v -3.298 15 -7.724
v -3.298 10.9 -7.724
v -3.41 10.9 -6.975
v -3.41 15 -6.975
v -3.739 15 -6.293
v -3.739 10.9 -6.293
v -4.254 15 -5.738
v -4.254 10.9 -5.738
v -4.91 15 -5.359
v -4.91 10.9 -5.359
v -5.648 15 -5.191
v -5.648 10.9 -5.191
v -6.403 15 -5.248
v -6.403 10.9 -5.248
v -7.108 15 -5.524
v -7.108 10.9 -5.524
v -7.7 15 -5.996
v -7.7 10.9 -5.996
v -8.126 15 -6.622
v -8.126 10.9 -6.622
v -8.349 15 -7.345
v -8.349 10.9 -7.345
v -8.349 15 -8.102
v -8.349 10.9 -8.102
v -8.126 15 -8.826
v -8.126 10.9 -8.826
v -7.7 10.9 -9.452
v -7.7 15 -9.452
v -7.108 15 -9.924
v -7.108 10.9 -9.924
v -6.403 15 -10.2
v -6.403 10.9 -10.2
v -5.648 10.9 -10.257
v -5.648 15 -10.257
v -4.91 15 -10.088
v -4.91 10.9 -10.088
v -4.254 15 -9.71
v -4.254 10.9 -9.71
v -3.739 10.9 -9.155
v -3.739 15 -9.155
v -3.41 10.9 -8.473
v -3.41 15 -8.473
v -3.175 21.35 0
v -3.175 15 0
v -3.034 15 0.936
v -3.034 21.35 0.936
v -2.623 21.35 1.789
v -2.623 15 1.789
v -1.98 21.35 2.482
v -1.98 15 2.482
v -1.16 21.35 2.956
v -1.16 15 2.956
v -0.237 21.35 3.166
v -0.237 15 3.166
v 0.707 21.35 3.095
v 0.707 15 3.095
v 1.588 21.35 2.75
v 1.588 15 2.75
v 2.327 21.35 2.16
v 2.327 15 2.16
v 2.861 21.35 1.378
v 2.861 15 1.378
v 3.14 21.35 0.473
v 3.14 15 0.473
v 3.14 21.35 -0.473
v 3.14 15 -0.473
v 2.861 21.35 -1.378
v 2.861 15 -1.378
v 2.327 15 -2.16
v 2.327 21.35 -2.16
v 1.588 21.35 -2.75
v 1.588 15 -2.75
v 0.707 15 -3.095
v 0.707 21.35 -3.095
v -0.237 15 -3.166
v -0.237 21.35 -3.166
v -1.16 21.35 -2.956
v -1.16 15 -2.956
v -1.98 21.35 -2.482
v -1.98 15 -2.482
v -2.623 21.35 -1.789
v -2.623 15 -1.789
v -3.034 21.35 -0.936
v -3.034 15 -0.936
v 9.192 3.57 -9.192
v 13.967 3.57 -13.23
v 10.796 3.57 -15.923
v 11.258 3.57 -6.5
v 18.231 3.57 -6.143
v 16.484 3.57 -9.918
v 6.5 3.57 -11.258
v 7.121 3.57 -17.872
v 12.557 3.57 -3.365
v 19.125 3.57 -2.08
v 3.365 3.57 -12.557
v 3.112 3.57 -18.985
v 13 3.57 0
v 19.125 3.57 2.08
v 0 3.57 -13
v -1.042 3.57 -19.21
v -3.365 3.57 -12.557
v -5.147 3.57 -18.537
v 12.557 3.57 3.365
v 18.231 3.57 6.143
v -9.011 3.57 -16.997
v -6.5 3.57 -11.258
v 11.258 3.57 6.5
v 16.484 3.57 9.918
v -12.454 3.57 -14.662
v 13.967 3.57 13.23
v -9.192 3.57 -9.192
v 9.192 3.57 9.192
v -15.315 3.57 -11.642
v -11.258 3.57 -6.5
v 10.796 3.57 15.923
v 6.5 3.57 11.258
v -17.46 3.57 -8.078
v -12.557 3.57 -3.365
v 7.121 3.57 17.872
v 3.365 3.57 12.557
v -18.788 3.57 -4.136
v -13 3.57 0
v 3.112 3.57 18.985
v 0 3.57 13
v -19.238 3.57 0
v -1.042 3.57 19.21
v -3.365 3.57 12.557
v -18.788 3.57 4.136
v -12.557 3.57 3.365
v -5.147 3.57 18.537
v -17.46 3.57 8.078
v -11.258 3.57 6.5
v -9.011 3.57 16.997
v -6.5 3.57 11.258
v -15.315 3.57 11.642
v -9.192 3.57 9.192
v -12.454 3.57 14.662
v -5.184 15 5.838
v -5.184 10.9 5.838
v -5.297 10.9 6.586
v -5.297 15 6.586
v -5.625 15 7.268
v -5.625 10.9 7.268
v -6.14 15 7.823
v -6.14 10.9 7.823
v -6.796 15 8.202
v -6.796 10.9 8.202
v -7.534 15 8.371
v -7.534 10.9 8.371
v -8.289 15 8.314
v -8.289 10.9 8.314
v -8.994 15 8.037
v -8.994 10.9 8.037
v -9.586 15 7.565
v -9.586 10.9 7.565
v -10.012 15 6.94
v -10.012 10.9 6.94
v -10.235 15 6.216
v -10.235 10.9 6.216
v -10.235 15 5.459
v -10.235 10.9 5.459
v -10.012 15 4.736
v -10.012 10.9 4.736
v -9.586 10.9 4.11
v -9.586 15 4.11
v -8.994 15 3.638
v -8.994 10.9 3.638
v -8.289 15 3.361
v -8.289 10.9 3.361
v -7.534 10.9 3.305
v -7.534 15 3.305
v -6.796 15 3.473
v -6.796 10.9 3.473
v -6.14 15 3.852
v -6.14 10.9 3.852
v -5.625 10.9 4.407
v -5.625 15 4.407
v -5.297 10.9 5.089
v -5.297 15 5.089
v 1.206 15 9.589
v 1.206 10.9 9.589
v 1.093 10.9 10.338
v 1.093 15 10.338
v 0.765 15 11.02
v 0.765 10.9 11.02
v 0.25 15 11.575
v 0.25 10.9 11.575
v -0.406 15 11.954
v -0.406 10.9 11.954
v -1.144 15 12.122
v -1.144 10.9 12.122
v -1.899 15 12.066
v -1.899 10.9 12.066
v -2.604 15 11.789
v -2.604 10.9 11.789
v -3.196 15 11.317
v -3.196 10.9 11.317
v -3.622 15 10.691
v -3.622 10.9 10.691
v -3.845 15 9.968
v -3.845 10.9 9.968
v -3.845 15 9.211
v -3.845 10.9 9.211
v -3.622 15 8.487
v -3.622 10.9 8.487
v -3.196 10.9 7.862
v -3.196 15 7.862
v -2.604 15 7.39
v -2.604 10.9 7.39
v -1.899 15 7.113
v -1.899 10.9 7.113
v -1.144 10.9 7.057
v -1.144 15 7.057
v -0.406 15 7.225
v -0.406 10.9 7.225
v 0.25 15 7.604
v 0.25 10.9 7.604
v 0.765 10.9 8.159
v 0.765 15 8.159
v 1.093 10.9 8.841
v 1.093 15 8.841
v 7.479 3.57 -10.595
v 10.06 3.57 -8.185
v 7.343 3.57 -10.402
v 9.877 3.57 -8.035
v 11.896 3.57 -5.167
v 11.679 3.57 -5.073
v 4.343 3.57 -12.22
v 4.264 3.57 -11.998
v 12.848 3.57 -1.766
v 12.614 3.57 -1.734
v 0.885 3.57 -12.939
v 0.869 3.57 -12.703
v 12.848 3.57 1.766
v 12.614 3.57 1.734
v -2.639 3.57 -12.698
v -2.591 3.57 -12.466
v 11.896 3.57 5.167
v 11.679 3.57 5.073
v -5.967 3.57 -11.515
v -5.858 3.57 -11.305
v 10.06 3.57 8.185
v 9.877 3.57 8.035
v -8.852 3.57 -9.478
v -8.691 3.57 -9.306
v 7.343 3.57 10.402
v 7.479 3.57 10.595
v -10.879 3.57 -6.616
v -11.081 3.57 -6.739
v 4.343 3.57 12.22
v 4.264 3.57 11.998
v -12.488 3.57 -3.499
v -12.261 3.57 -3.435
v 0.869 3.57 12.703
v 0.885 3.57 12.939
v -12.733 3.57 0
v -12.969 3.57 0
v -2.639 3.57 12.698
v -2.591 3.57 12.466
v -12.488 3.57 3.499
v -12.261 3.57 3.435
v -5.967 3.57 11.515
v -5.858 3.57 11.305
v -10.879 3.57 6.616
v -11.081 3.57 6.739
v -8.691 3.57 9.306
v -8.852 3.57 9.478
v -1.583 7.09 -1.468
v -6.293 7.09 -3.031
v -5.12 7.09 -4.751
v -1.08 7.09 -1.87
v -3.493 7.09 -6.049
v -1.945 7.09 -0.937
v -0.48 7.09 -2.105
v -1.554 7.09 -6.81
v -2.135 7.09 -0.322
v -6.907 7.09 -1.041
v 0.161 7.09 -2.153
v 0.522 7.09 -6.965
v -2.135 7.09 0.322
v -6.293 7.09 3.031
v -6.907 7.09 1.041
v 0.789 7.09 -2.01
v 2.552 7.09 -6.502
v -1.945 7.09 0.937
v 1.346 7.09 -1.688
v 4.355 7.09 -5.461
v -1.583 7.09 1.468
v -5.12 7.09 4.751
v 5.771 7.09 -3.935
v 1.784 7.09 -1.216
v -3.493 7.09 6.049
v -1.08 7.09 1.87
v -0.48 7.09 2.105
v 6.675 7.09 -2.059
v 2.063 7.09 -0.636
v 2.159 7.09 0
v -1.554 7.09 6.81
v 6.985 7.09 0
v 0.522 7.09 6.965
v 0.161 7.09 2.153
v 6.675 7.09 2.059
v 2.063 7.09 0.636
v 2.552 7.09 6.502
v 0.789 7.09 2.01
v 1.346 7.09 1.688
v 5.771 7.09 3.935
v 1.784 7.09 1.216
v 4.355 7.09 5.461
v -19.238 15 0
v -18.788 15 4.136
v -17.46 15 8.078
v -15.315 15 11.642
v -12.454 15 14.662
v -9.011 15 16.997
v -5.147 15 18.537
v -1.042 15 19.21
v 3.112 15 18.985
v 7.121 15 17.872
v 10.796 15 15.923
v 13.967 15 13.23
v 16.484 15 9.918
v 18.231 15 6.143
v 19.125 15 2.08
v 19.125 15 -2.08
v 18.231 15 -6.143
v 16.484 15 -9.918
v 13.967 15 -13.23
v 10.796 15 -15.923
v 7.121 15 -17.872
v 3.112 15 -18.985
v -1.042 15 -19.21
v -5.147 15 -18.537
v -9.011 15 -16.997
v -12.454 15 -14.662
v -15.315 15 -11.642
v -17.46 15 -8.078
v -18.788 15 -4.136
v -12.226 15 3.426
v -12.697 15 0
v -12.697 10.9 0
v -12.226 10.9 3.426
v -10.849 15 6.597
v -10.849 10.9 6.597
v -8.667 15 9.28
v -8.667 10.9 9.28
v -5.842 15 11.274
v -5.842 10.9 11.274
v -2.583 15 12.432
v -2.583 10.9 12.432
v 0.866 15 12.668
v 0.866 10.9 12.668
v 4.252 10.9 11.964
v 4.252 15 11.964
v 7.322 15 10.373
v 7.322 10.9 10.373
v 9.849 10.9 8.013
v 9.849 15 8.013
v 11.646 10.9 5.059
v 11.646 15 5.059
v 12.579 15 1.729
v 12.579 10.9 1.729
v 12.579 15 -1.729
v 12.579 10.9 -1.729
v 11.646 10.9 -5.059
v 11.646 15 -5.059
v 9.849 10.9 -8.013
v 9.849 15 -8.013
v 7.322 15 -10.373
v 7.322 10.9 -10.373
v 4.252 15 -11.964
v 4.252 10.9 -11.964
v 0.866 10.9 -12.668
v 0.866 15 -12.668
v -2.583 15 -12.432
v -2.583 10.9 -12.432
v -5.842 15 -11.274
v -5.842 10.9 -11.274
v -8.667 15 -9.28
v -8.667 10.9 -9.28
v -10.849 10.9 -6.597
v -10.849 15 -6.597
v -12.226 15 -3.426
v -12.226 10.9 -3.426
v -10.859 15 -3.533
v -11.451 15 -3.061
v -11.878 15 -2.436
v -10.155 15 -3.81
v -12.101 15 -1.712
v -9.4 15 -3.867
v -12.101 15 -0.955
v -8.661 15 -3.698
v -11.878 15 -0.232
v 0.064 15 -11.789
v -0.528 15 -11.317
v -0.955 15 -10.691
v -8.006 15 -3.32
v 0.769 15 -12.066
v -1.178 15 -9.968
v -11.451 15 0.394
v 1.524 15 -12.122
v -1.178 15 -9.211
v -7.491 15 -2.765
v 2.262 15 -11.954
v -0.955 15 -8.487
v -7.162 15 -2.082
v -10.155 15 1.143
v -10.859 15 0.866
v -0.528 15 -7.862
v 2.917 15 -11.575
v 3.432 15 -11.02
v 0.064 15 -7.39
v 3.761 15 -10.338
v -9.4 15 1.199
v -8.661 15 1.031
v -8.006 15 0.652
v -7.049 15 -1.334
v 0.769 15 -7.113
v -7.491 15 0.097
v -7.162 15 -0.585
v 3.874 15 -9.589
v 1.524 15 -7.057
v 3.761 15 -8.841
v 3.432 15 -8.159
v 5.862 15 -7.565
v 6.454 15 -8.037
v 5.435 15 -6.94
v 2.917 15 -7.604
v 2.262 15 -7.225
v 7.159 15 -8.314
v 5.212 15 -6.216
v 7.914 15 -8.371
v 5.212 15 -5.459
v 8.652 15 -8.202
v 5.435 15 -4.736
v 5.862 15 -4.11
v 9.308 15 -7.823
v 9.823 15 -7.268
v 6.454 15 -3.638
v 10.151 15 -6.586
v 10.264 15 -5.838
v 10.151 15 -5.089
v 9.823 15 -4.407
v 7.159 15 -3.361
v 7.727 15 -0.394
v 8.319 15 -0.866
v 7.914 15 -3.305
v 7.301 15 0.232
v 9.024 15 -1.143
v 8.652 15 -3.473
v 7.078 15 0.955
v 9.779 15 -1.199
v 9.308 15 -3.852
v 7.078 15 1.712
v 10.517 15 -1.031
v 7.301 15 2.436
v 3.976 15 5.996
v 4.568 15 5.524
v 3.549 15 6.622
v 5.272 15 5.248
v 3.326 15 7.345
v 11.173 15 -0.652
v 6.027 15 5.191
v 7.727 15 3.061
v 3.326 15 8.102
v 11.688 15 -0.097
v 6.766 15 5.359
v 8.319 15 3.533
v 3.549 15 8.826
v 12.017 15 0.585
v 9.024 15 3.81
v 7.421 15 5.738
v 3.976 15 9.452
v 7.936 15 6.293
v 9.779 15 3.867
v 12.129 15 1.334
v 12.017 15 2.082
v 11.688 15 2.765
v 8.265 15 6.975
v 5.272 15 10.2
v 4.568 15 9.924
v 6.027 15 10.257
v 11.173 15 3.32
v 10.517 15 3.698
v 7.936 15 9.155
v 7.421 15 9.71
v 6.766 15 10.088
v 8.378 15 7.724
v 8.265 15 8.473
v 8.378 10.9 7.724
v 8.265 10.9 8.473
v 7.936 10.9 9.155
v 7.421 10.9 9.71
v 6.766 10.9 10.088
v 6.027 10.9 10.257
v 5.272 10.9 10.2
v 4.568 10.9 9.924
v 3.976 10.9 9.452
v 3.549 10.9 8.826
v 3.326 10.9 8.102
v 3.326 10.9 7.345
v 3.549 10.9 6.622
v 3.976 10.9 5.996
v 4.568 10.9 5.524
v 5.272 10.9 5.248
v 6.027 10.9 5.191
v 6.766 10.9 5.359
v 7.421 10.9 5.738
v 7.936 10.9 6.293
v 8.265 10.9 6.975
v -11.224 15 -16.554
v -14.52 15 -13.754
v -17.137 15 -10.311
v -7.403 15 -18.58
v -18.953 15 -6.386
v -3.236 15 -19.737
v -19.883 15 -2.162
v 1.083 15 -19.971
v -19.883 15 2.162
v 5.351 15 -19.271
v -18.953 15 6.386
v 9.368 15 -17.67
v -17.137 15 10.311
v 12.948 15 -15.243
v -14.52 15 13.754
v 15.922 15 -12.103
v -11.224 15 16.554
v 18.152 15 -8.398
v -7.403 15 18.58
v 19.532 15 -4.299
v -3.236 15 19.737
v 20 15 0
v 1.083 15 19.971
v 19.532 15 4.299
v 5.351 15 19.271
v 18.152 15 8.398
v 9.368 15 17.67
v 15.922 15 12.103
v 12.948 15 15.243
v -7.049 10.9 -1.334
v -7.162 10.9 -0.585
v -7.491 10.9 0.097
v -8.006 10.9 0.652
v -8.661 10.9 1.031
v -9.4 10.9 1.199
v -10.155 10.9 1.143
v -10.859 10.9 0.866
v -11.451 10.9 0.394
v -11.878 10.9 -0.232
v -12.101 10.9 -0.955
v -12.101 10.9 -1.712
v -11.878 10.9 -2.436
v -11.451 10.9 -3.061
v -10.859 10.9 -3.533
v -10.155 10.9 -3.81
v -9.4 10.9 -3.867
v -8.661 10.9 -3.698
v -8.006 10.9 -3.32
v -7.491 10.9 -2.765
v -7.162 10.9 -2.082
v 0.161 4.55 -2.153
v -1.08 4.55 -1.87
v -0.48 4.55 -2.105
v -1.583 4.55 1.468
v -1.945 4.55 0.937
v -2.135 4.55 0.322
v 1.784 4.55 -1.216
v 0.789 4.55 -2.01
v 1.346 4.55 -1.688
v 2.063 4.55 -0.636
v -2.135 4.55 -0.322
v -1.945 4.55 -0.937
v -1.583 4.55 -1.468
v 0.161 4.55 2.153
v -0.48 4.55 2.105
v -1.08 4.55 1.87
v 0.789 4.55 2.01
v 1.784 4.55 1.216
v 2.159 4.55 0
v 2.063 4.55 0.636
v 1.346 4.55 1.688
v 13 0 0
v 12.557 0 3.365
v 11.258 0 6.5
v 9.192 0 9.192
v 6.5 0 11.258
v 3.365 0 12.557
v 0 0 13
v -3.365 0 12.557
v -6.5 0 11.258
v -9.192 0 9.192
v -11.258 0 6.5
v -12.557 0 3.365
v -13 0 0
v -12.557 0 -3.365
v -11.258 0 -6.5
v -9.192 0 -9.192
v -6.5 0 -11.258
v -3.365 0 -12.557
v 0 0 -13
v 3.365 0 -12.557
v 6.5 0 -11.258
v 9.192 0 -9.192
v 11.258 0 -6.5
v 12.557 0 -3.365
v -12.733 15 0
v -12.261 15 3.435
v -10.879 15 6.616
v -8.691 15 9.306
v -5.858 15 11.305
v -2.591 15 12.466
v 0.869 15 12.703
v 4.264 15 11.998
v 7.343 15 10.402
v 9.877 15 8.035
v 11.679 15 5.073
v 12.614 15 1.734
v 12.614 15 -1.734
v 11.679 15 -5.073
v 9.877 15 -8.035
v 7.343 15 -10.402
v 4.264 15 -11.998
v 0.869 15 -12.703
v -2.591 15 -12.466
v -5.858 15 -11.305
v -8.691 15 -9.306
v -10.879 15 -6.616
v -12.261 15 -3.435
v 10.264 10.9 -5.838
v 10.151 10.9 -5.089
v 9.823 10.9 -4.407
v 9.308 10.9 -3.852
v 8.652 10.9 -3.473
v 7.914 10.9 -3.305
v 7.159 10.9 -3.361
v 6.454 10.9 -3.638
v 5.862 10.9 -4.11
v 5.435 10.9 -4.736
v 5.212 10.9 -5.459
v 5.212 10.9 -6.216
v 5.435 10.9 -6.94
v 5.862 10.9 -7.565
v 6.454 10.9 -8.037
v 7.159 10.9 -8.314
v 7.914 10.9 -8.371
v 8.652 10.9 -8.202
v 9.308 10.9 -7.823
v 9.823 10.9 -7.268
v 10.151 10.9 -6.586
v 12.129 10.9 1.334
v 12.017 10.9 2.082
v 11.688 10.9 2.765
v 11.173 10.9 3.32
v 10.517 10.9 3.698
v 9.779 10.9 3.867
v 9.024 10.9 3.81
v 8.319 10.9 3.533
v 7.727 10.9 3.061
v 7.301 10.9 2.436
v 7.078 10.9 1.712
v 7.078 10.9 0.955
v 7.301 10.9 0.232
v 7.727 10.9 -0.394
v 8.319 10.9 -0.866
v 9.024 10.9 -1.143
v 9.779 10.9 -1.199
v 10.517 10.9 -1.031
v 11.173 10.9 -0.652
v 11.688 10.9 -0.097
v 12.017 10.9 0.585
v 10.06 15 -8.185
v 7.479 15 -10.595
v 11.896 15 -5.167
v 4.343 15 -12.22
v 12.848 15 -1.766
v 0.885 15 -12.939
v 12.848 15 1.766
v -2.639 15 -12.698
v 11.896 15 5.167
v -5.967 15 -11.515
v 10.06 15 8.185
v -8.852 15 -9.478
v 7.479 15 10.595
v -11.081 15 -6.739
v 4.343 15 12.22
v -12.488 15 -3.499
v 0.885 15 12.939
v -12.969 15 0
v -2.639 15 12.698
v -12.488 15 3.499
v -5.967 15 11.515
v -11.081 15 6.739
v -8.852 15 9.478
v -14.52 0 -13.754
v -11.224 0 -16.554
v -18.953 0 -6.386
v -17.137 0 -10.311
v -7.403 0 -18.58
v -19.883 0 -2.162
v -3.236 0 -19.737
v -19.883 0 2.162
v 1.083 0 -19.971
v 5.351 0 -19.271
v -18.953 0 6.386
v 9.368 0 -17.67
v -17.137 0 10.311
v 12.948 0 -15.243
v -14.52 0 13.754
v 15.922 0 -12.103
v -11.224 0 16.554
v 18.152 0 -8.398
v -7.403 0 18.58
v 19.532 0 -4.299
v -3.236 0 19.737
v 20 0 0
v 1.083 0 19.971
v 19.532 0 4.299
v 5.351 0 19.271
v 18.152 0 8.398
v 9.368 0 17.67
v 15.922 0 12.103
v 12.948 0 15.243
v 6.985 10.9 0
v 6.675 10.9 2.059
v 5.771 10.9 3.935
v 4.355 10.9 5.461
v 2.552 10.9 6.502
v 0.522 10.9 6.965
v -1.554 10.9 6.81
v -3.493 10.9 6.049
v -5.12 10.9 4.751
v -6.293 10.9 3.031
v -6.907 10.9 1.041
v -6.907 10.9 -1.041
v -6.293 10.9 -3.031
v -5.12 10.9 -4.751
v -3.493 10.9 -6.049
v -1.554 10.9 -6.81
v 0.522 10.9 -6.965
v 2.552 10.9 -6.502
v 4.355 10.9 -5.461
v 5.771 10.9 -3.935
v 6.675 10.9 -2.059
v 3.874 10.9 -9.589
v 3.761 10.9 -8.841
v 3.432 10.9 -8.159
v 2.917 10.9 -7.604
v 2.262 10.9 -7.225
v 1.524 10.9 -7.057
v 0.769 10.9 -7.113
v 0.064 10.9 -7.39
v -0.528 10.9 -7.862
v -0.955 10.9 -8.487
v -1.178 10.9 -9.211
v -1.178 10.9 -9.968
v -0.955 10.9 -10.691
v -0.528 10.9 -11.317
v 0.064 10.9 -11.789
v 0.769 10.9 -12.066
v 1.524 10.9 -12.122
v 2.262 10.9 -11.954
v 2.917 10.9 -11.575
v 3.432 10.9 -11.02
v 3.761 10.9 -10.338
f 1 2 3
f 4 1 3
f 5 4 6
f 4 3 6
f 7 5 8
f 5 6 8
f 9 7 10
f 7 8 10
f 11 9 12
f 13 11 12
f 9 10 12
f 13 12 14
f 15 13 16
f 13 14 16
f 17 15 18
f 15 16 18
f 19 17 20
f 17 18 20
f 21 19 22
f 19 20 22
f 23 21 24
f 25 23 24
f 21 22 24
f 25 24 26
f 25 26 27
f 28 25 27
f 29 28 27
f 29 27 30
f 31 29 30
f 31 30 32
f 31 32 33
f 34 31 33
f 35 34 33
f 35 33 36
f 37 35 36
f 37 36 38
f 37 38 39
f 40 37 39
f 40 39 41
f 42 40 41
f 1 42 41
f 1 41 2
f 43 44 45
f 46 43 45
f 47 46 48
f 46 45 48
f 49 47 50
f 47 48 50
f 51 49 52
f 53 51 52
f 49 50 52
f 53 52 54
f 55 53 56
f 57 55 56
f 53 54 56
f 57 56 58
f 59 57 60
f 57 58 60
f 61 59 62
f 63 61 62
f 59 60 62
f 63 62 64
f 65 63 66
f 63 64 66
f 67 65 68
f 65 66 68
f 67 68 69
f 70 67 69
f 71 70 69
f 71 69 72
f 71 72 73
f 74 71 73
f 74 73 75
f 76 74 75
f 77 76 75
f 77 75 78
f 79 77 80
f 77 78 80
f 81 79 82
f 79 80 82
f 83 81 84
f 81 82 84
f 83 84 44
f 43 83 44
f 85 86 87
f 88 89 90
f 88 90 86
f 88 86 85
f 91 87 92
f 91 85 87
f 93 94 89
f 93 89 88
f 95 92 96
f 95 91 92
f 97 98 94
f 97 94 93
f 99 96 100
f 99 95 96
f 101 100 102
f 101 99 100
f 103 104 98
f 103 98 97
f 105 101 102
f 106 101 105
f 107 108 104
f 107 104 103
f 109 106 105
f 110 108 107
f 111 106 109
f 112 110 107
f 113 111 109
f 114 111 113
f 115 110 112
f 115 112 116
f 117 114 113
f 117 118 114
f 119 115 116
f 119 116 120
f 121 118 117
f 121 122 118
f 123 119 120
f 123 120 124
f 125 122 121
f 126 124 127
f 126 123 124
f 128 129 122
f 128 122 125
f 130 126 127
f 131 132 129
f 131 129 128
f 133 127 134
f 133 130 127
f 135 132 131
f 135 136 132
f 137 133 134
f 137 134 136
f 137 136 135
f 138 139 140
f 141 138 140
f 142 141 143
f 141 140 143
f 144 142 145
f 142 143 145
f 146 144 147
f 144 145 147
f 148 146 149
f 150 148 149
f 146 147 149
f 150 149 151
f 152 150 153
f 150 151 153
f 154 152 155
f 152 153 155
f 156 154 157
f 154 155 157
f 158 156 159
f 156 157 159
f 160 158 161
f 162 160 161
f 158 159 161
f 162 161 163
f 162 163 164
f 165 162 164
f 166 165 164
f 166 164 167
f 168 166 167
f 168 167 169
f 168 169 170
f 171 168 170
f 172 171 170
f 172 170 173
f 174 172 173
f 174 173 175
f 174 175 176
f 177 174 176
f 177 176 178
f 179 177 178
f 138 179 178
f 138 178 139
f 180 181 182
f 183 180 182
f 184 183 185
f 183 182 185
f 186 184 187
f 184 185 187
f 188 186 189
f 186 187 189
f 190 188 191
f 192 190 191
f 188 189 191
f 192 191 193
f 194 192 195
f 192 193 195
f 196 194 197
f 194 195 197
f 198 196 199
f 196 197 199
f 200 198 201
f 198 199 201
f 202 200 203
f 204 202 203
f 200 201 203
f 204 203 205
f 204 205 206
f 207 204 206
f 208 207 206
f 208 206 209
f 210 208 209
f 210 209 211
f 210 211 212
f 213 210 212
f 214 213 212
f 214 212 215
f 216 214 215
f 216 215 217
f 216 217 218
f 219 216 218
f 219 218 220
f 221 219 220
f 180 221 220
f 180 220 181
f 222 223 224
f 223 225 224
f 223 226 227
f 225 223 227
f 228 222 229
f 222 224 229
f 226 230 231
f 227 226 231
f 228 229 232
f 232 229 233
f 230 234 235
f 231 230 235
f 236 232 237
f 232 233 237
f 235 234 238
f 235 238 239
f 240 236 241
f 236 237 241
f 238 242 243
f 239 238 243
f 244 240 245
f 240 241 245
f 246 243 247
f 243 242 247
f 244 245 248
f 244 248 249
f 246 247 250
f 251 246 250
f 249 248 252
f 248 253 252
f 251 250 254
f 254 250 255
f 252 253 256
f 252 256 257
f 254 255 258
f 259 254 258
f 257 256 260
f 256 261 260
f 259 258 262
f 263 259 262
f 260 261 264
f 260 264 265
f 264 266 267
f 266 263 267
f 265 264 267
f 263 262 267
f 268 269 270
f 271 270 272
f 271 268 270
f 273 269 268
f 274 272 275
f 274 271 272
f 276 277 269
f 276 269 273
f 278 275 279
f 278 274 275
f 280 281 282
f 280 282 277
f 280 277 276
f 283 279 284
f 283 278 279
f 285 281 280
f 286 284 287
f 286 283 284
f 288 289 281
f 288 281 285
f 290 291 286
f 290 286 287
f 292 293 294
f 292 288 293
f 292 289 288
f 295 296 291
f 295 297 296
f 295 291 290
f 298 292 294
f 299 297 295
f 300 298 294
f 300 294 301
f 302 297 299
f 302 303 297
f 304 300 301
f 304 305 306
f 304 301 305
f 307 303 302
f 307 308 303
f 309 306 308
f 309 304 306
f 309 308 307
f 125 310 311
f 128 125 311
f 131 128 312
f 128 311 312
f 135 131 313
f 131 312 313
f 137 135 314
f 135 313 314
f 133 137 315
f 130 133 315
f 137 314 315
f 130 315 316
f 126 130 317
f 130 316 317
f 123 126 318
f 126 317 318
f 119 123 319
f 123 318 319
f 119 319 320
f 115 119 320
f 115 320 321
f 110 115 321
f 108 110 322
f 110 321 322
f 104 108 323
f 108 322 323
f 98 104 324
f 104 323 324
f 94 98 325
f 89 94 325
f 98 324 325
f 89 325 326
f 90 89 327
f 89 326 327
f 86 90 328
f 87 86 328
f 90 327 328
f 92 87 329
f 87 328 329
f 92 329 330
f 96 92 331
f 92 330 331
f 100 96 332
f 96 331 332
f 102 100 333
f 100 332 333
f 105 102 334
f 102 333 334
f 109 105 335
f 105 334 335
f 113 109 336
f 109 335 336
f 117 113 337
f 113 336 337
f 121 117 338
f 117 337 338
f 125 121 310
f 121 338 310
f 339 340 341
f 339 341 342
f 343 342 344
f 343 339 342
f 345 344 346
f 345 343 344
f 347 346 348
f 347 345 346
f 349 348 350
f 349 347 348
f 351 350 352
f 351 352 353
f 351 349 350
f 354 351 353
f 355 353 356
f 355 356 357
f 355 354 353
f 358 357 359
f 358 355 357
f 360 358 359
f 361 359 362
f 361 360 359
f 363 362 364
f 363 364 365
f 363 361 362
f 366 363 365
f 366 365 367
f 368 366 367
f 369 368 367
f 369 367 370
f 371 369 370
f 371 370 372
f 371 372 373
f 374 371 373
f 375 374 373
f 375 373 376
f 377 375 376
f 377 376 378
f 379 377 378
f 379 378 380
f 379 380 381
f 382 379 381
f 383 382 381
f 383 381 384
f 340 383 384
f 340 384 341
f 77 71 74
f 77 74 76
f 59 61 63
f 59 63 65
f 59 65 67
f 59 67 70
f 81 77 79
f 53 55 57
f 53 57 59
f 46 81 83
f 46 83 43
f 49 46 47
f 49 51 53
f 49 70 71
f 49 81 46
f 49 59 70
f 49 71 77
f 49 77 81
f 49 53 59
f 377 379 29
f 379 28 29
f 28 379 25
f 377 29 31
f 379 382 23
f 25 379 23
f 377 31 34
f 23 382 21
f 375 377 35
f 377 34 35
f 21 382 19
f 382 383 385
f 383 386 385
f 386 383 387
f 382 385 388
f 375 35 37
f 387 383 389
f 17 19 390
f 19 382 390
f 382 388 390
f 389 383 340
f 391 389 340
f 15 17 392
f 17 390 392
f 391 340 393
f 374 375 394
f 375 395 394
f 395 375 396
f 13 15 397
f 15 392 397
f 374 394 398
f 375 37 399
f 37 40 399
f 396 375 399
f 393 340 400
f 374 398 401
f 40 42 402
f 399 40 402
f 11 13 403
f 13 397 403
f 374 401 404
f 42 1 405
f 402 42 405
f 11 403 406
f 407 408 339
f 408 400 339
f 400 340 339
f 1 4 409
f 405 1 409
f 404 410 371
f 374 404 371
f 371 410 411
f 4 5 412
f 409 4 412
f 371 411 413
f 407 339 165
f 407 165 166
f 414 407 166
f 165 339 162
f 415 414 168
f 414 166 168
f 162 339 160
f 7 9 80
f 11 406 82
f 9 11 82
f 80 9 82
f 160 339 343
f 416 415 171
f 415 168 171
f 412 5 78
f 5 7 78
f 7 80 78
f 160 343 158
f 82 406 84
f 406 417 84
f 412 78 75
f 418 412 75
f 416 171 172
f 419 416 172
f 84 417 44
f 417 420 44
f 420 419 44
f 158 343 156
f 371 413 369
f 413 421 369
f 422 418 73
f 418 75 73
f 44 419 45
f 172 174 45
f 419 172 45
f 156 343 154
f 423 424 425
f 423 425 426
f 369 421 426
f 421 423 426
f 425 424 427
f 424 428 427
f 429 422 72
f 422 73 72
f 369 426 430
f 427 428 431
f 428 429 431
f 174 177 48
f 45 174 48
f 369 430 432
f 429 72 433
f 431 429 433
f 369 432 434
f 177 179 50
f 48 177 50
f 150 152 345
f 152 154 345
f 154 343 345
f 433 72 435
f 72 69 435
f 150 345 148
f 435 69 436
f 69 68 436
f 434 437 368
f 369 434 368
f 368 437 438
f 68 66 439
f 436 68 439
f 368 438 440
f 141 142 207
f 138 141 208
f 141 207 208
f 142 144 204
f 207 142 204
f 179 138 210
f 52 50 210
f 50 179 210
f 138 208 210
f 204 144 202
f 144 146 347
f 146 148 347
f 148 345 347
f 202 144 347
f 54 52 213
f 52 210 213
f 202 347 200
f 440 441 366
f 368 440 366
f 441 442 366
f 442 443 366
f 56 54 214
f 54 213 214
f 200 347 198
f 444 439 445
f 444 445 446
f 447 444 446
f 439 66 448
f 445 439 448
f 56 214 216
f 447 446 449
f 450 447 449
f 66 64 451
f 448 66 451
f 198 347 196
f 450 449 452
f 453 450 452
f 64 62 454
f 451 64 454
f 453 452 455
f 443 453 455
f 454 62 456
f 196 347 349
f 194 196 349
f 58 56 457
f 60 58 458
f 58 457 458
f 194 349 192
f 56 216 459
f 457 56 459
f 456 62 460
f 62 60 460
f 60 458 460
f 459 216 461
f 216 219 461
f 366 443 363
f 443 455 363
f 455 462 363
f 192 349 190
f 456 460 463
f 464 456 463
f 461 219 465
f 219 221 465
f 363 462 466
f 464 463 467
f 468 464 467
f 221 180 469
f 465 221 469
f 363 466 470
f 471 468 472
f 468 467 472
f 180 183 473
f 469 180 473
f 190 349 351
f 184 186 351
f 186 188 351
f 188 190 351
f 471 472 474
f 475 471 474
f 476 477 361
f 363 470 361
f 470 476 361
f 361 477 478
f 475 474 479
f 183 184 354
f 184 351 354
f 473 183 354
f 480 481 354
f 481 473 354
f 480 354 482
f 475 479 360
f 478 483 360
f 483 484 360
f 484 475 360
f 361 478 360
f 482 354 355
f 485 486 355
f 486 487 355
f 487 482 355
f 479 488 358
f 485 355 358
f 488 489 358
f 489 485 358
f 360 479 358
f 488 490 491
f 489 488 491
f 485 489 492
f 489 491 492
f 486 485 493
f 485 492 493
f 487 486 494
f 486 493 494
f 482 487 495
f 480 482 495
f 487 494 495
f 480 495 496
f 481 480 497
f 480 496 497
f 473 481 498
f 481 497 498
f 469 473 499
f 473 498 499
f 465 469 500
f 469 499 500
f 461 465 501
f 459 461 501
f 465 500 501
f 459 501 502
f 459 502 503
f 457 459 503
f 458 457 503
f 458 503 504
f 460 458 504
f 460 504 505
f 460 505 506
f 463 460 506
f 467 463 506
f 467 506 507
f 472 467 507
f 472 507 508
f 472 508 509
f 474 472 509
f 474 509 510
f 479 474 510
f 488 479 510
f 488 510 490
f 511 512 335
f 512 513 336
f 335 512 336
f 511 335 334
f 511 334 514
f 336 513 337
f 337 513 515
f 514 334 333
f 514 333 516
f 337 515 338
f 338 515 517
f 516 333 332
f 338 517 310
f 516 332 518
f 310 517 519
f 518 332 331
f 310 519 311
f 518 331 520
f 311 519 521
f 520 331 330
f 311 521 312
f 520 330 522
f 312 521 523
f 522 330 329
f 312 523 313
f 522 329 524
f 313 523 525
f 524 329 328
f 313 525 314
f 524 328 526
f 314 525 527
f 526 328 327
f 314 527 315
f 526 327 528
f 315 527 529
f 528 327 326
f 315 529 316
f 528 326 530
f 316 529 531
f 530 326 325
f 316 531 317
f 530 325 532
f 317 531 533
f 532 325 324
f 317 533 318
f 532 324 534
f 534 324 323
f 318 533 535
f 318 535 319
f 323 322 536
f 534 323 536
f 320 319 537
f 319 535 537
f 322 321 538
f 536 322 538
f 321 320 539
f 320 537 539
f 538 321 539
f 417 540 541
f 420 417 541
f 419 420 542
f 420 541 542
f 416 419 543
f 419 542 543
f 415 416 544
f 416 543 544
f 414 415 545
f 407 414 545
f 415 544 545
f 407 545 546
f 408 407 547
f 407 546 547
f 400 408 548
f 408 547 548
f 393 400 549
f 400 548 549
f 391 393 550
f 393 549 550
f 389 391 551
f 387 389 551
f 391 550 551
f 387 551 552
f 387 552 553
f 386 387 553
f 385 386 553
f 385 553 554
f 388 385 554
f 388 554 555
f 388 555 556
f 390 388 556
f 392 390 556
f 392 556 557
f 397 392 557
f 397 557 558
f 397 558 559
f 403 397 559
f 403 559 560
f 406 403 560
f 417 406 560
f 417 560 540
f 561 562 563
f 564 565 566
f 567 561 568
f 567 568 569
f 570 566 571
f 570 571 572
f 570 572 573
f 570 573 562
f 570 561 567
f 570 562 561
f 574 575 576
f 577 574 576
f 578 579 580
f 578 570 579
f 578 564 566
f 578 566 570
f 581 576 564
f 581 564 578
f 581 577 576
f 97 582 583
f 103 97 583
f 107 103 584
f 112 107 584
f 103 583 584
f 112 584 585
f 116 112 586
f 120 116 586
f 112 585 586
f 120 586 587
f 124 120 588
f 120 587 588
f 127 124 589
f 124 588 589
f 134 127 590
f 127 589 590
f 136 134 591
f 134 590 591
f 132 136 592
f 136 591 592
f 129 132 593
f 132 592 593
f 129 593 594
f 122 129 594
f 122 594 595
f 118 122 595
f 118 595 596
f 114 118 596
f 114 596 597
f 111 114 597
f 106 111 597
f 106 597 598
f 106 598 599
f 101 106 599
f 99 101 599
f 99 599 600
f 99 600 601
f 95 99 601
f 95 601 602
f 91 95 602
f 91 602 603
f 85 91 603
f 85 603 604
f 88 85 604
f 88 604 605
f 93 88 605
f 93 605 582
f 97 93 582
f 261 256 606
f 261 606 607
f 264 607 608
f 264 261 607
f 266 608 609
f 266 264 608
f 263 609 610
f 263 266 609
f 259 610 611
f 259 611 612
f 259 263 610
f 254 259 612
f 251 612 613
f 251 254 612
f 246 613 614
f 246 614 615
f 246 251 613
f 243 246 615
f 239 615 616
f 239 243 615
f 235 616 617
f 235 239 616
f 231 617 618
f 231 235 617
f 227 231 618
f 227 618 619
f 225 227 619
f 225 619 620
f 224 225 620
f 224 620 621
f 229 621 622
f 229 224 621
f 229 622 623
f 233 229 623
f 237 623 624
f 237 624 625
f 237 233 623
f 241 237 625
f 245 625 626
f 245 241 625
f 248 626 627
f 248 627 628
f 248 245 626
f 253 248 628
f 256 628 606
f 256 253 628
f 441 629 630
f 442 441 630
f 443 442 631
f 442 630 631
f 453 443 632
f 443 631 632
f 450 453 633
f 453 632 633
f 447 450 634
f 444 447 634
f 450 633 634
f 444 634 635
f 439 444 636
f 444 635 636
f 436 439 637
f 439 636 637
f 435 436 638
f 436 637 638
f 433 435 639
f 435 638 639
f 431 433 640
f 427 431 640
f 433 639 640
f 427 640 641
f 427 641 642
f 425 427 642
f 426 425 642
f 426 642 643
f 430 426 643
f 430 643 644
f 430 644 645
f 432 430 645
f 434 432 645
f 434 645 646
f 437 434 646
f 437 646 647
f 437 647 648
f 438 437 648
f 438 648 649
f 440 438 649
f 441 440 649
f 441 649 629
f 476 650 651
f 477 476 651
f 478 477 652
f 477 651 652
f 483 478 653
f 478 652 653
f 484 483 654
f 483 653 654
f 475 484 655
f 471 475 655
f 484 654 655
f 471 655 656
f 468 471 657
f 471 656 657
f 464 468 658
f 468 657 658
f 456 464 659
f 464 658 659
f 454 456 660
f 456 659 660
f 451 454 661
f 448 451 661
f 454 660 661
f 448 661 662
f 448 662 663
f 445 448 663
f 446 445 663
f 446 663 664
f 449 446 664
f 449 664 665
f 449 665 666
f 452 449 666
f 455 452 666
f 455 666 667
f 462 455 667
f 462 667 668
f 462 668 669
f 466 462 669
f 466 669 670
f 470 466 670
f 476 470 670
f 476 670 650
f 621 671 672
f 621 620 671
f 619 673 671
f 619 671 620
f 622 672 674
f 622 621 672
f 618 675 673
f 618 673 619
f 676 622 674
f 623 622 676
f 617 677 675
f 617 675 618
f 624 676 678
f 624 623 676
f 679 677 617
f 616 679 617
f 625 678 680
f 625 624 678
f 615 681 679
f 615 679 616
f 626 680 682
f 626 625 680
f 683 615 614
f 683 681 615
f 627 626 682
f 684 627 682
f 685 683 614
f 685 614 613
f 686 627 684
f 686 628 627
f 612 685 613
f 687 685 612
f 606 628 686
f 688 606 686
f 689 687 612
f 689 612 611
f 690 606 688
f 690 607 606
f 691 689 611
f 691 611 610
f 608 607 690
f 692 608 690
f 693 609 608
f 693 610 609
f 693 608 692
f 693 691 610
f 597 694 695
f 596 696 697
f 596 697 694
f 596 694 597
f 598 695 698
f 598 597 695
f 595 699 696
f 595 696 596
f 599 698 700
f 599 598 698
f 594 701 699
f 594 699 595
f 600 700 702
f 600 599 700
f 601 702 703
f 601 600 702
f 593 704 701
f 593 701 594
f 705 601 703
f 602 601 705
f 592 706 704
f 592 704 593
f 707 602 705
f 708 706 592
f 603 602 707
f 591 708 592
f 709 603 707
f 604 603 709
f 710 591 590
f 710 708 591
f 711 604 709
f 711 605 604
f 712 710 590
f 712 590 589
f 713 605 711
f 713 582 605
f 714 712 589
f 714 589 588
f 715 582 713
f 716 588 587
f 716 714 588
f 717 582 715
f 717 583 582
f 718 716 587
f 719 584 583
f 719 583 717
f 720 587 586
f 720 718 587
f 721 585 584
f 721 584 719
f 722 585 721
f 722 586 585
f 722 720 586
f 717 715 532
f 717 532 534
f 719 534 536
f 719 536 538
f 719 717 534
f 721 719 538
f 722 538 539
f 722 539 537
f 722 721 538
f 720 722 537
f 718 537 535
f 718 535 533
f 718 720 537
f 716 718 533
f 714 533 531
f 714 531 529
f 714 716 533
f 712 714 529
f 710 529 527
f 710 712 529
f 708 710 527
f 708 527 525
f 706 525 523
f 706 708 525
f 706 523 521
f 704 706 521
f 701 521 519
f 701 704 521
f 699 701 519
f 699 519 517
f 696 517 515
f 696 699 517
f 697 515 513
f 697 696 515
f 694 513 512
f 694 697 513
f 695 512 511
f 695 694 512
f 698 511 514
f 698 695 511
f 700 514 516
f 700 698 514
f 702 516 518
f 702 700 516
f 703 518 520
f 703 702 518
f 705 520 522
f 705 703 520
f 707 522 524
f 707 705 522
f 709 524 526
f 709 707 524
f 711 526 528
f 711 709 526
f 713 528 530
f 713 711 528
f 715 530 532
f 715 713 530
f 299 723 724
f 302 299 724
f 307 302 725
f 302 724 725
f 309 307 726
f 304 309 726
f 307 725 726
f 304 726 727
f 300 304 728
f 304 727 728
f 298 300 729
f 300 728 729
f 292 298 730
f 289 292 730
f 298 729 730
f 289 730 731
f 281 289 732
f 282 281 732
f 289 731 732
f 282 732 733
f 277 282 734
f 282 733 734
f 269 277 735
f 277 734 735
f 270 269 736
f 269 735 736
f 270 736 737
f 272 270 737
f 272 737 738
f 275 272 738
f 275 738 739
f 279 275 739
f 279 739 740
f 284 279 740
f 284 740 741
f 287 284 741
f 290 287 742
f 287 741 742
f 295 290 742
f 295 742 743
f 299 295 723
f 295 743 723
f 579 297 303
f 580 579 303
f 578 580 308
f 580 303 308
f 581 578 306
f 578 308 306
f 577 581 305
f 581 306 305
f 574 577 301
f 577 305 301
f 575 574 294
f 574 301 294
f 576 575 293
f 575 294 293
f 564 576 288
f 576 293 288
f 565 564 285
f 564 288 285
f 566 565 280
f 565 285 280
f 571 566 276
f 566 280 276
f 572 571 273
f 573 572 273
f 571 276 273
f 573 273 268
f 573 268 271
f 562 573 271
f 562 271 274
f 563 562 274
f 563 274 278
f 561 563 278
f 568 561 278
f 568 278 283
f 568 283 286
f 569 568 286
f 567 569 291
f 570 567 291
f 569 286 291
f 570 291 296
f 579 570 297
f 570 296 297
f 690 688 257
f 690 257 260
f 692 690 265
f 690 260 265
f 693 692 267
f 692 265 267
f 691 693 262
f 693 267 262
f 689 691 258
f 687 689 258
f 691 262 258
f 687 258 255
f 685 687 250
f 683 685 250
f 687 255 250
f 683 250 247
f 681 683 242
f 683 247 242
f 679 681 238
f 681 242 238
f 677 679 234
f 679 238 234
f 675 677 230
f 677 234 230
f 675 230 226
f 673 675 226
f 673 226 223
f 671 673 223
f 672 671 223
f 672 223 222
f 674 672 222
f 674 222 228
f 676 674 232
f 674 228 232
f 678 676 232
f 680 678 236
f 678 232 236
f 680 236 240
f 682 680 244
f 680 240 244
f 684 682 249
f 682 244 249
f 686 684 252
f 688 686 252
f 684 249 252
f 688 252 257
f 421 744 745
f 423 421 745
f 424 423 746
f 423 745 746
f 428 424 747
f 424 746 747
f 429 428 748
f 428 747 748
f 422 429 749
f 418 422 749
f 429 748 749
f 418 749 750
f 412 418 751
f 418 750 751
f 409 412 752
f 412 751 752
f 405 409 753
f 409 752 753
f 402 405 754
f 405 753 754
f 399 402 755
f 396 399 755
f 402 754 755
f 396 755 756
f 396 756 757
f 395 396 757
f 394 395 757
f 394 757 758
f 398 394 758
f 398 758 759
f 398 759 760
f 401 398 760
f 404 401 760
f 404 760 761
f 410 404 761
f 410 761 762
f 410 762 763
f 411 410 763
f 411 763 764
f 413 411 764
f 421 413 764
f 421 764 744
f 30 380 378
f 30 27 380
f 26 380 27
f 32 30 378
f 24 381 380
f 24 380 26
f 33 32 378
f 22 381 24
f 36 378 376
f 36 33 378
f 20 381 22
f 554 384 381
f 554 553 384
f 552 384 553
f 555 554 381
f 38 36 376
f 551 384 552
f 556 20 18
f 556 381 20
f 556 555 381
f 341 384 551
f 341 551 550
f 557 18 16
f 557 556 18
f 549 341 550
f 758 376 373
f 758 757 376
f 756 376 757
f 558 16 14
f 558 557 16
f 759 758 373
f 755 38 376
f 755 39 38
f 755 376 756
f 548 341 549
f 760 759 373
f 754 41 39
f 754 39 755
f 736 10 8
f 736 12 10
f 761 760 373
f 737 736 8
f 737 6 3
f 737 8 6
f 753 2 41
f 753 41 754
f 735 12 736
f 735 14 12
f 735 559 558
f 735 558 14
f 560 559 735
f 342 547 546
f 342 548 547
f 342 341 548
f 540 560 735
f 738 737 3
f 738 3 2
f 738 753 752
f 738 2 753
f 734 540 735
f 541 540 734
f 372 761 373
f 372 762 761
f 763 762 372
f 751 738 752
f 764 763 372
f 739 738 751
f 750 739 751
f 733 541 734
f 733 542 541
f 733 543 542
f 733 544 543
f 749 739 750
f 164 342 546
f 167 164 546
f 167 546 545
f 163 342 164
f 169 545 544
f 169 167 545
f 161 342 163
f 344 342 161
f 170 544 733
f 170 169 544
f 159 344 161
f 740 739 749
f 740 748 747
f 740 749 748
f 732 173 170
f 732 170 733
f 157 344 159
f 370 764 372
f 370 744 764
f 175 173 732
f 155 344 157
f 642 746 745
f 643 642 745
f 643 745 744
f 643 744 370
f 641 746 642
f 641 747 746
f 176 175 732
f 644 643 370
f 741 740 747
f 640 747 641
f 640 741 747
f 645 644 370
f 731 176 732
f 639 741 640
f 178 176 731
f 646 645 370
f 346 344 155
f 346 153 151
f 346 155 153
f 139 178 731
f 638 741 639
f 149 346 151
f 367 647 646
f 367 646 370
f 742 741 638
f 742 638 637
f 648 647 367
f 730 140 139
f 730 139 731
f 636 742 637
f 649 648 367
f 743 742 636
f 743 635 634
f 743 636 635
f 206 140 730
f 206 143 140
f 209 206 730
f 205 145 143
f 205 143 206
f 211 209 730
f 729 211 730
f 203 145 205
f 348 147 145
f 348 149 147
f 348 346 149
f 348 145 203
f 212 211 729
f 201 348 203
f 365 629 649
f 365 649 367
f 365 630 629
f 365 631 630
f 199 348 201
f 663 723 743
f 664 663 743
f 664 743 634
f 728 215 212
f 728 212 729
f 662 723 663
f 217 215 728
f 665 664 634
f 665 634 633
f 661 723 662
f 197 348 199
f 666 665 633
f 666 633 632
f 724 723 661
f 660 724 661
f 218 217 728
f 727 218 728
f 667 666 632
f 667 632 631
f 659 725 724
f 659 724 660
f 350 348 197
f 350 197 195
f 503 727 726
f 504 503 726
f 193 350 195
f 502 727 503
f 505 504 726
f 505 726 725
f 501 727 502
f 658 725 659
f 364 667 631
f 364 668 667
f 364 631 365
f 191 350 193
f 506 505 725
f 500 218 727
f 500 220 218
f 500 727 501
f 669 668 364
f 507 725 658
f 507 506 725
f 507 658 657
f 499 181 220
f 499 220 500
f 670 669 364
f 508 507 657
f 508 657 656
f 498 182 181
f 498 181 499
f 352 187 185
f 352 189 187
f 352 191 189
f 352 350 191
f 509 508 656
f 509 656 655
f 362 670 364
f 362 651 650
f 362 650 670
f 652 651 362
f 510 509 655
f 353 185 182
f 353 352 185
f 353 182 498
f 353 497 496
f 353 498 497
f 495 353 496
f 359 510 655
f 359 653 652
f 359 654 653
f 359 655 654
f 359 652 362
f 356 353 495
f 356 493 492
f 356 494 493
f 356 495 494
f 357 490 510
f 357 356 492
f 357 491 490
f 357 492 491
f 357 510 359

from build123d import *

# Parameters (mm, degrees)
F0_R      = 20
F0_R_2    = 2.54
F1_DEPTH  = 15
F2_R      = 13
F3_DEPTH  = 10.9
F4_R      = 6.985
F5_DEPTH  = 3.81
F6_R      = 2.159
F7_DEPTH  = 2.54
F8_R      = 19.238
F8_R_2    = 12.697305
F9_DEPTH  = 11.43
F10_R     = 3.175
F11_DEPTH = 6.35
F12_R     = 12.969206
F12_R_2   = 12.732754
F13_DEPTH = 11.43


with BuildPart() as f1:
    # F0 (on Front) → F1 (new body)
    with BuildSketch(Plane.XZ):
        Circle(F0_R)
        with Locations((-5.837628, -7.723867)):
            Circle(F0_R_2, mode=Mode.SUBTRACT)
        with Locations((-9.589425, -1.333773)):
            Circle(F0_R_2, mode=Mode.SUBTRACT)
        with Locations((1.333773, -9.589425)):
            Circle(F0_R_2, mode=Mode.SUBTRACT)
        with Locations((7.723867, -5.837628)):
            Circle(F0_R_2, mode=Mode.SUBTRACT)
        with Locations((-7.723867, 5.837628)):
            Circle(F0_R_2, mode=Mode.SUBTRACT)
        with Locations((-1.333773, 9.589425)):
            Circle(F0_R_2, mode=Mode.SUBTRACT)
        with Locations((9.589425, 1.333773)):
            Circle(F0_R_2, mode=Mode.SUBTRACT)
        with Locations((5.837628, 7.723867)):
            Circle(F0_R_2, mode=Mode.SUBTRACT)
    extrude(amount=-F1_DEPTH)

    # F2 (on face) → F3 (cut)
    with BuildSketch(Plane.XZ):
        Circle(F2_R)
    extrude(amount=-F3_DEPTH, mode=Mode.SUBTRACT)

    # F4 (on face) → F5 (join)
    with BuildSketch(Plane.XZ.offset(-10.9)):
        Circle(F4_R)
    extrude(amount=F5_DEPTH)

    # F6 (on face) → F7 (join)
    with BuildSketch(Plane.XZ.offset(-7.09)):
        Circle(F6_R)
    extrude(amount=F7_DEPTH)

    # F8 (on face) → F9 (cut)
    with BuildSketch(Plane(origin=(0, 15, 0), x_dir=(-1, 0, 0), z_dir=(0, 1, 0))):
        Circle(F8_R)
        Circle(F8_R_2, mode=Mode.SUBTRACT)
    extrude(amount=-F9_DEPTH, mode=Mode.SUBTRACT)

    # F10 (on face) → F11 (join)
    with BuildSketch(Plane(origin=(0, 15, 0), x_dir=(-1, 0, 0), z_dir=(0, 1, 0))):
        Circle(F10_R)
    extrude(amount=F11_DEPTH)


with BuildPart() as f13:
    # F12 (on face) → F13 (new body)
    with BuildSketch(Plane(origin=(0, 3.57, 0), x_dir=(-1, 0, 0), z_dir=(0, 1, 0))):
        Circle(F12_R)
        Circle(F12_R_2, mode=Mode.SUBTRACT)
    extrude(amount=F13_DEPTH)


solid = Compound([f1.part, f13.part])
